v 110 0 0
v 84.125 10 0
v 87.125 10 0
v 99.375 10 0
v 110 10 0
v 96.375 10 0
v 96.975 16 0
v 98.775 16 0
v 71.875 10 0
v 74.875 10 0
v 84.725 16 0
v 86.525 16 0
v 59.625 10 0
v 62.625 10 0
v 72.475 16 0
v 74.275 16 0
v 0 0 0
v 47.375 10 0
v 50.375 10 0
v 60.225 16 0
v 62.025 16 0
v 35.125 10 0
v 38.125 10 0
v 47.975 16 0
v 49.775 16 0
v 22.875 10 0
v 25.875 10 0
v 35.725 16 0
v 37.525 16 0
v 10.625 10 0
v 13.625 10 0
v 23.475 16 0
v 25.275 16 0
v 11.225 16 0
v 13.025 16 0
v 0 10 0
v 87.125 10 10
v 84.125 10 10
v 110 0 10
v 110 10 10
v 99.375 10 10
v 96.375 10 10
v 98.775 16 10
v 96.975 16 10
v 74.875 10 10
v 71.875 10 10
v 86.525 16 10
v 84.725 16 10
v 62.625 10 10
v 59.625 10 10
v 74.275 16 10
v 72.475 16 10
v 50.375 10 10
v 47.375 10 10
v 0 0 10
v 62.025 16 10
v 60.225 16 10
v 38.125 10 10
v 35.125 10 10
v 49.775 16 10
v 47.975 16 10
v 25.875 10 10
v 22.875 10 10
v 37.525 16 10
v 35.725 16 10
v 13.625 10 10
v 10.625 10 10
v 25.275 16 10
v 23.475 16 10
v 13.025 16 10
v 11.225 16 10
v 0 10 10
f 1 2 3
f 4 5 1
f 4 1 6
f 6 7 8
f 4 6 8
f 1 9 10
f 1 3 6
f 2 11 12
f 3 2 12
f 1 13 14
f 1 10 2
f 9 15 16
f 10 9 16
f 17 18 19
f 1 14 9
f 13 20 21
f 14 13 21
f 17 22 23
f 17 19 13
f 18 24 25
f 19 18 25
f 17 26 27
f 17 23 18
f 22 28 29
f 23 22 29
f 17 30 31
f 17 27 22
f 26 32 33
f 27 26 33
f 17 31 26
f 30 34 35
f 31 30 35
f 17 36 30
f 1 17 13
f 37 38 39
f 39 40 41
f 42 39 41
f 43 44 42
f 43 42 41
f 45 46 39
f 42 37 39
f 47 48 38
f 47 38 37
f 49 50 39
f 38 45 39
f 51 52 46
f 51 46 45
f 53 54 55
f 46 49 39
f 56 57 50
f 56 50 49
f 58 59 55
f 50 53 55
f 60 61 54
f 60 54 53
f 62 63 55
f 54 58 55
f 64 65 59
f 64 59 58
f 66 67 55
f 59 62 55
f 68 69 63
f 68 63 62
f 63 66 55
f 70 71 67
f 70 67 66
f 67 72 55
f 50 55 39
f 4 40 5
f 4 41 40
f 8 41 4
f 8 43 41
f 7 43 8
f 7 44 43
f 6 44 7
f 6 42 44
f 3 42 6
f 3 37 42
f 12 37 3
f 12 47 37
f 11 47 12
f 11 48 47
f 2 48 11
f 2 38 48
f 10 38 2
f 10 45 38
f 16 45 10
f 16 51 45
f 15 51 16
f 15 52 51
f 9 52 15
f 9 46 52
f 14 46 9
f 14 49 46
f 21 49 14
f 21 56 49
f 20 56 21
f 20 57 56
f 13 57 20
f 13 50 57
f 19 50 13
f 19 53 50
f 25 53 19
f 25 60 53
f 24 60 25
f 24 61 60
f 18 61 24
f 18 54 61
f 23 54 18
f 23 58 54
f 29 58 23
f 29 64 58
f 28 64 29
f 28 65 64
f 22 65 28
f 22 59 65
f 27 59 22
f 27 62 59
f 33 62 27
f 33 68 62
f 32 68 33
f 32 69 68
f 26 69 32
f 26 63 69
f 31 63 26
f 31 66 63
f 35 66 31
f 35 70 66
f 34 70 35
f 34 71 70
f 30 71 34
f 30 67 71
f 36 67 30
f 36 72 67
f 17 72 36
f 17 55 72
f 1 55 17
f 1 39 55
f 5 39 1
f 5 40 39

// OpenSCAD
$fn = 32;

// ----------------------------------------------------------------------
// Gear rack: 8 teeth on a 110 mm bar, pitch 12.25 mm
// ----------------------------------------------------------------------

// --- parameters (mm) ---
profile_height = 10;      // extrusion height
profile_points = 36;      // points of the closed outline

profile = [[0, 0], [110, 0], [110, 10], [99.375, 10], [98.775, 16], [96.975, 16], [96.375, 10], [87.125, 10], [86.525, 16], [84.725, 16], [84.125, 10], [74.875, 10], [74.275, 16], [72.475, 16], [71.875, 10], [62.625, 10], [62.025, 16], [60.225, 16], [59.625, 10], [50.375, 10], [49.775, 16], [47.975, 16], [47.375, 10], [38.125, 10], [37.525, 16], [35.725, 16], [35.125, 10], [25.875, 10], [25.275, 16], [23.475, 16], [22.875, 10], [13.625, 10], [13.025, 16], [11.225, 16], [10.625, 10], [0, 10]];  // single closed polygon, 36 points, counter clockwise

// --- the one profile operation ---
linear_extrude(height = profile_height) polygon(points = profile);
